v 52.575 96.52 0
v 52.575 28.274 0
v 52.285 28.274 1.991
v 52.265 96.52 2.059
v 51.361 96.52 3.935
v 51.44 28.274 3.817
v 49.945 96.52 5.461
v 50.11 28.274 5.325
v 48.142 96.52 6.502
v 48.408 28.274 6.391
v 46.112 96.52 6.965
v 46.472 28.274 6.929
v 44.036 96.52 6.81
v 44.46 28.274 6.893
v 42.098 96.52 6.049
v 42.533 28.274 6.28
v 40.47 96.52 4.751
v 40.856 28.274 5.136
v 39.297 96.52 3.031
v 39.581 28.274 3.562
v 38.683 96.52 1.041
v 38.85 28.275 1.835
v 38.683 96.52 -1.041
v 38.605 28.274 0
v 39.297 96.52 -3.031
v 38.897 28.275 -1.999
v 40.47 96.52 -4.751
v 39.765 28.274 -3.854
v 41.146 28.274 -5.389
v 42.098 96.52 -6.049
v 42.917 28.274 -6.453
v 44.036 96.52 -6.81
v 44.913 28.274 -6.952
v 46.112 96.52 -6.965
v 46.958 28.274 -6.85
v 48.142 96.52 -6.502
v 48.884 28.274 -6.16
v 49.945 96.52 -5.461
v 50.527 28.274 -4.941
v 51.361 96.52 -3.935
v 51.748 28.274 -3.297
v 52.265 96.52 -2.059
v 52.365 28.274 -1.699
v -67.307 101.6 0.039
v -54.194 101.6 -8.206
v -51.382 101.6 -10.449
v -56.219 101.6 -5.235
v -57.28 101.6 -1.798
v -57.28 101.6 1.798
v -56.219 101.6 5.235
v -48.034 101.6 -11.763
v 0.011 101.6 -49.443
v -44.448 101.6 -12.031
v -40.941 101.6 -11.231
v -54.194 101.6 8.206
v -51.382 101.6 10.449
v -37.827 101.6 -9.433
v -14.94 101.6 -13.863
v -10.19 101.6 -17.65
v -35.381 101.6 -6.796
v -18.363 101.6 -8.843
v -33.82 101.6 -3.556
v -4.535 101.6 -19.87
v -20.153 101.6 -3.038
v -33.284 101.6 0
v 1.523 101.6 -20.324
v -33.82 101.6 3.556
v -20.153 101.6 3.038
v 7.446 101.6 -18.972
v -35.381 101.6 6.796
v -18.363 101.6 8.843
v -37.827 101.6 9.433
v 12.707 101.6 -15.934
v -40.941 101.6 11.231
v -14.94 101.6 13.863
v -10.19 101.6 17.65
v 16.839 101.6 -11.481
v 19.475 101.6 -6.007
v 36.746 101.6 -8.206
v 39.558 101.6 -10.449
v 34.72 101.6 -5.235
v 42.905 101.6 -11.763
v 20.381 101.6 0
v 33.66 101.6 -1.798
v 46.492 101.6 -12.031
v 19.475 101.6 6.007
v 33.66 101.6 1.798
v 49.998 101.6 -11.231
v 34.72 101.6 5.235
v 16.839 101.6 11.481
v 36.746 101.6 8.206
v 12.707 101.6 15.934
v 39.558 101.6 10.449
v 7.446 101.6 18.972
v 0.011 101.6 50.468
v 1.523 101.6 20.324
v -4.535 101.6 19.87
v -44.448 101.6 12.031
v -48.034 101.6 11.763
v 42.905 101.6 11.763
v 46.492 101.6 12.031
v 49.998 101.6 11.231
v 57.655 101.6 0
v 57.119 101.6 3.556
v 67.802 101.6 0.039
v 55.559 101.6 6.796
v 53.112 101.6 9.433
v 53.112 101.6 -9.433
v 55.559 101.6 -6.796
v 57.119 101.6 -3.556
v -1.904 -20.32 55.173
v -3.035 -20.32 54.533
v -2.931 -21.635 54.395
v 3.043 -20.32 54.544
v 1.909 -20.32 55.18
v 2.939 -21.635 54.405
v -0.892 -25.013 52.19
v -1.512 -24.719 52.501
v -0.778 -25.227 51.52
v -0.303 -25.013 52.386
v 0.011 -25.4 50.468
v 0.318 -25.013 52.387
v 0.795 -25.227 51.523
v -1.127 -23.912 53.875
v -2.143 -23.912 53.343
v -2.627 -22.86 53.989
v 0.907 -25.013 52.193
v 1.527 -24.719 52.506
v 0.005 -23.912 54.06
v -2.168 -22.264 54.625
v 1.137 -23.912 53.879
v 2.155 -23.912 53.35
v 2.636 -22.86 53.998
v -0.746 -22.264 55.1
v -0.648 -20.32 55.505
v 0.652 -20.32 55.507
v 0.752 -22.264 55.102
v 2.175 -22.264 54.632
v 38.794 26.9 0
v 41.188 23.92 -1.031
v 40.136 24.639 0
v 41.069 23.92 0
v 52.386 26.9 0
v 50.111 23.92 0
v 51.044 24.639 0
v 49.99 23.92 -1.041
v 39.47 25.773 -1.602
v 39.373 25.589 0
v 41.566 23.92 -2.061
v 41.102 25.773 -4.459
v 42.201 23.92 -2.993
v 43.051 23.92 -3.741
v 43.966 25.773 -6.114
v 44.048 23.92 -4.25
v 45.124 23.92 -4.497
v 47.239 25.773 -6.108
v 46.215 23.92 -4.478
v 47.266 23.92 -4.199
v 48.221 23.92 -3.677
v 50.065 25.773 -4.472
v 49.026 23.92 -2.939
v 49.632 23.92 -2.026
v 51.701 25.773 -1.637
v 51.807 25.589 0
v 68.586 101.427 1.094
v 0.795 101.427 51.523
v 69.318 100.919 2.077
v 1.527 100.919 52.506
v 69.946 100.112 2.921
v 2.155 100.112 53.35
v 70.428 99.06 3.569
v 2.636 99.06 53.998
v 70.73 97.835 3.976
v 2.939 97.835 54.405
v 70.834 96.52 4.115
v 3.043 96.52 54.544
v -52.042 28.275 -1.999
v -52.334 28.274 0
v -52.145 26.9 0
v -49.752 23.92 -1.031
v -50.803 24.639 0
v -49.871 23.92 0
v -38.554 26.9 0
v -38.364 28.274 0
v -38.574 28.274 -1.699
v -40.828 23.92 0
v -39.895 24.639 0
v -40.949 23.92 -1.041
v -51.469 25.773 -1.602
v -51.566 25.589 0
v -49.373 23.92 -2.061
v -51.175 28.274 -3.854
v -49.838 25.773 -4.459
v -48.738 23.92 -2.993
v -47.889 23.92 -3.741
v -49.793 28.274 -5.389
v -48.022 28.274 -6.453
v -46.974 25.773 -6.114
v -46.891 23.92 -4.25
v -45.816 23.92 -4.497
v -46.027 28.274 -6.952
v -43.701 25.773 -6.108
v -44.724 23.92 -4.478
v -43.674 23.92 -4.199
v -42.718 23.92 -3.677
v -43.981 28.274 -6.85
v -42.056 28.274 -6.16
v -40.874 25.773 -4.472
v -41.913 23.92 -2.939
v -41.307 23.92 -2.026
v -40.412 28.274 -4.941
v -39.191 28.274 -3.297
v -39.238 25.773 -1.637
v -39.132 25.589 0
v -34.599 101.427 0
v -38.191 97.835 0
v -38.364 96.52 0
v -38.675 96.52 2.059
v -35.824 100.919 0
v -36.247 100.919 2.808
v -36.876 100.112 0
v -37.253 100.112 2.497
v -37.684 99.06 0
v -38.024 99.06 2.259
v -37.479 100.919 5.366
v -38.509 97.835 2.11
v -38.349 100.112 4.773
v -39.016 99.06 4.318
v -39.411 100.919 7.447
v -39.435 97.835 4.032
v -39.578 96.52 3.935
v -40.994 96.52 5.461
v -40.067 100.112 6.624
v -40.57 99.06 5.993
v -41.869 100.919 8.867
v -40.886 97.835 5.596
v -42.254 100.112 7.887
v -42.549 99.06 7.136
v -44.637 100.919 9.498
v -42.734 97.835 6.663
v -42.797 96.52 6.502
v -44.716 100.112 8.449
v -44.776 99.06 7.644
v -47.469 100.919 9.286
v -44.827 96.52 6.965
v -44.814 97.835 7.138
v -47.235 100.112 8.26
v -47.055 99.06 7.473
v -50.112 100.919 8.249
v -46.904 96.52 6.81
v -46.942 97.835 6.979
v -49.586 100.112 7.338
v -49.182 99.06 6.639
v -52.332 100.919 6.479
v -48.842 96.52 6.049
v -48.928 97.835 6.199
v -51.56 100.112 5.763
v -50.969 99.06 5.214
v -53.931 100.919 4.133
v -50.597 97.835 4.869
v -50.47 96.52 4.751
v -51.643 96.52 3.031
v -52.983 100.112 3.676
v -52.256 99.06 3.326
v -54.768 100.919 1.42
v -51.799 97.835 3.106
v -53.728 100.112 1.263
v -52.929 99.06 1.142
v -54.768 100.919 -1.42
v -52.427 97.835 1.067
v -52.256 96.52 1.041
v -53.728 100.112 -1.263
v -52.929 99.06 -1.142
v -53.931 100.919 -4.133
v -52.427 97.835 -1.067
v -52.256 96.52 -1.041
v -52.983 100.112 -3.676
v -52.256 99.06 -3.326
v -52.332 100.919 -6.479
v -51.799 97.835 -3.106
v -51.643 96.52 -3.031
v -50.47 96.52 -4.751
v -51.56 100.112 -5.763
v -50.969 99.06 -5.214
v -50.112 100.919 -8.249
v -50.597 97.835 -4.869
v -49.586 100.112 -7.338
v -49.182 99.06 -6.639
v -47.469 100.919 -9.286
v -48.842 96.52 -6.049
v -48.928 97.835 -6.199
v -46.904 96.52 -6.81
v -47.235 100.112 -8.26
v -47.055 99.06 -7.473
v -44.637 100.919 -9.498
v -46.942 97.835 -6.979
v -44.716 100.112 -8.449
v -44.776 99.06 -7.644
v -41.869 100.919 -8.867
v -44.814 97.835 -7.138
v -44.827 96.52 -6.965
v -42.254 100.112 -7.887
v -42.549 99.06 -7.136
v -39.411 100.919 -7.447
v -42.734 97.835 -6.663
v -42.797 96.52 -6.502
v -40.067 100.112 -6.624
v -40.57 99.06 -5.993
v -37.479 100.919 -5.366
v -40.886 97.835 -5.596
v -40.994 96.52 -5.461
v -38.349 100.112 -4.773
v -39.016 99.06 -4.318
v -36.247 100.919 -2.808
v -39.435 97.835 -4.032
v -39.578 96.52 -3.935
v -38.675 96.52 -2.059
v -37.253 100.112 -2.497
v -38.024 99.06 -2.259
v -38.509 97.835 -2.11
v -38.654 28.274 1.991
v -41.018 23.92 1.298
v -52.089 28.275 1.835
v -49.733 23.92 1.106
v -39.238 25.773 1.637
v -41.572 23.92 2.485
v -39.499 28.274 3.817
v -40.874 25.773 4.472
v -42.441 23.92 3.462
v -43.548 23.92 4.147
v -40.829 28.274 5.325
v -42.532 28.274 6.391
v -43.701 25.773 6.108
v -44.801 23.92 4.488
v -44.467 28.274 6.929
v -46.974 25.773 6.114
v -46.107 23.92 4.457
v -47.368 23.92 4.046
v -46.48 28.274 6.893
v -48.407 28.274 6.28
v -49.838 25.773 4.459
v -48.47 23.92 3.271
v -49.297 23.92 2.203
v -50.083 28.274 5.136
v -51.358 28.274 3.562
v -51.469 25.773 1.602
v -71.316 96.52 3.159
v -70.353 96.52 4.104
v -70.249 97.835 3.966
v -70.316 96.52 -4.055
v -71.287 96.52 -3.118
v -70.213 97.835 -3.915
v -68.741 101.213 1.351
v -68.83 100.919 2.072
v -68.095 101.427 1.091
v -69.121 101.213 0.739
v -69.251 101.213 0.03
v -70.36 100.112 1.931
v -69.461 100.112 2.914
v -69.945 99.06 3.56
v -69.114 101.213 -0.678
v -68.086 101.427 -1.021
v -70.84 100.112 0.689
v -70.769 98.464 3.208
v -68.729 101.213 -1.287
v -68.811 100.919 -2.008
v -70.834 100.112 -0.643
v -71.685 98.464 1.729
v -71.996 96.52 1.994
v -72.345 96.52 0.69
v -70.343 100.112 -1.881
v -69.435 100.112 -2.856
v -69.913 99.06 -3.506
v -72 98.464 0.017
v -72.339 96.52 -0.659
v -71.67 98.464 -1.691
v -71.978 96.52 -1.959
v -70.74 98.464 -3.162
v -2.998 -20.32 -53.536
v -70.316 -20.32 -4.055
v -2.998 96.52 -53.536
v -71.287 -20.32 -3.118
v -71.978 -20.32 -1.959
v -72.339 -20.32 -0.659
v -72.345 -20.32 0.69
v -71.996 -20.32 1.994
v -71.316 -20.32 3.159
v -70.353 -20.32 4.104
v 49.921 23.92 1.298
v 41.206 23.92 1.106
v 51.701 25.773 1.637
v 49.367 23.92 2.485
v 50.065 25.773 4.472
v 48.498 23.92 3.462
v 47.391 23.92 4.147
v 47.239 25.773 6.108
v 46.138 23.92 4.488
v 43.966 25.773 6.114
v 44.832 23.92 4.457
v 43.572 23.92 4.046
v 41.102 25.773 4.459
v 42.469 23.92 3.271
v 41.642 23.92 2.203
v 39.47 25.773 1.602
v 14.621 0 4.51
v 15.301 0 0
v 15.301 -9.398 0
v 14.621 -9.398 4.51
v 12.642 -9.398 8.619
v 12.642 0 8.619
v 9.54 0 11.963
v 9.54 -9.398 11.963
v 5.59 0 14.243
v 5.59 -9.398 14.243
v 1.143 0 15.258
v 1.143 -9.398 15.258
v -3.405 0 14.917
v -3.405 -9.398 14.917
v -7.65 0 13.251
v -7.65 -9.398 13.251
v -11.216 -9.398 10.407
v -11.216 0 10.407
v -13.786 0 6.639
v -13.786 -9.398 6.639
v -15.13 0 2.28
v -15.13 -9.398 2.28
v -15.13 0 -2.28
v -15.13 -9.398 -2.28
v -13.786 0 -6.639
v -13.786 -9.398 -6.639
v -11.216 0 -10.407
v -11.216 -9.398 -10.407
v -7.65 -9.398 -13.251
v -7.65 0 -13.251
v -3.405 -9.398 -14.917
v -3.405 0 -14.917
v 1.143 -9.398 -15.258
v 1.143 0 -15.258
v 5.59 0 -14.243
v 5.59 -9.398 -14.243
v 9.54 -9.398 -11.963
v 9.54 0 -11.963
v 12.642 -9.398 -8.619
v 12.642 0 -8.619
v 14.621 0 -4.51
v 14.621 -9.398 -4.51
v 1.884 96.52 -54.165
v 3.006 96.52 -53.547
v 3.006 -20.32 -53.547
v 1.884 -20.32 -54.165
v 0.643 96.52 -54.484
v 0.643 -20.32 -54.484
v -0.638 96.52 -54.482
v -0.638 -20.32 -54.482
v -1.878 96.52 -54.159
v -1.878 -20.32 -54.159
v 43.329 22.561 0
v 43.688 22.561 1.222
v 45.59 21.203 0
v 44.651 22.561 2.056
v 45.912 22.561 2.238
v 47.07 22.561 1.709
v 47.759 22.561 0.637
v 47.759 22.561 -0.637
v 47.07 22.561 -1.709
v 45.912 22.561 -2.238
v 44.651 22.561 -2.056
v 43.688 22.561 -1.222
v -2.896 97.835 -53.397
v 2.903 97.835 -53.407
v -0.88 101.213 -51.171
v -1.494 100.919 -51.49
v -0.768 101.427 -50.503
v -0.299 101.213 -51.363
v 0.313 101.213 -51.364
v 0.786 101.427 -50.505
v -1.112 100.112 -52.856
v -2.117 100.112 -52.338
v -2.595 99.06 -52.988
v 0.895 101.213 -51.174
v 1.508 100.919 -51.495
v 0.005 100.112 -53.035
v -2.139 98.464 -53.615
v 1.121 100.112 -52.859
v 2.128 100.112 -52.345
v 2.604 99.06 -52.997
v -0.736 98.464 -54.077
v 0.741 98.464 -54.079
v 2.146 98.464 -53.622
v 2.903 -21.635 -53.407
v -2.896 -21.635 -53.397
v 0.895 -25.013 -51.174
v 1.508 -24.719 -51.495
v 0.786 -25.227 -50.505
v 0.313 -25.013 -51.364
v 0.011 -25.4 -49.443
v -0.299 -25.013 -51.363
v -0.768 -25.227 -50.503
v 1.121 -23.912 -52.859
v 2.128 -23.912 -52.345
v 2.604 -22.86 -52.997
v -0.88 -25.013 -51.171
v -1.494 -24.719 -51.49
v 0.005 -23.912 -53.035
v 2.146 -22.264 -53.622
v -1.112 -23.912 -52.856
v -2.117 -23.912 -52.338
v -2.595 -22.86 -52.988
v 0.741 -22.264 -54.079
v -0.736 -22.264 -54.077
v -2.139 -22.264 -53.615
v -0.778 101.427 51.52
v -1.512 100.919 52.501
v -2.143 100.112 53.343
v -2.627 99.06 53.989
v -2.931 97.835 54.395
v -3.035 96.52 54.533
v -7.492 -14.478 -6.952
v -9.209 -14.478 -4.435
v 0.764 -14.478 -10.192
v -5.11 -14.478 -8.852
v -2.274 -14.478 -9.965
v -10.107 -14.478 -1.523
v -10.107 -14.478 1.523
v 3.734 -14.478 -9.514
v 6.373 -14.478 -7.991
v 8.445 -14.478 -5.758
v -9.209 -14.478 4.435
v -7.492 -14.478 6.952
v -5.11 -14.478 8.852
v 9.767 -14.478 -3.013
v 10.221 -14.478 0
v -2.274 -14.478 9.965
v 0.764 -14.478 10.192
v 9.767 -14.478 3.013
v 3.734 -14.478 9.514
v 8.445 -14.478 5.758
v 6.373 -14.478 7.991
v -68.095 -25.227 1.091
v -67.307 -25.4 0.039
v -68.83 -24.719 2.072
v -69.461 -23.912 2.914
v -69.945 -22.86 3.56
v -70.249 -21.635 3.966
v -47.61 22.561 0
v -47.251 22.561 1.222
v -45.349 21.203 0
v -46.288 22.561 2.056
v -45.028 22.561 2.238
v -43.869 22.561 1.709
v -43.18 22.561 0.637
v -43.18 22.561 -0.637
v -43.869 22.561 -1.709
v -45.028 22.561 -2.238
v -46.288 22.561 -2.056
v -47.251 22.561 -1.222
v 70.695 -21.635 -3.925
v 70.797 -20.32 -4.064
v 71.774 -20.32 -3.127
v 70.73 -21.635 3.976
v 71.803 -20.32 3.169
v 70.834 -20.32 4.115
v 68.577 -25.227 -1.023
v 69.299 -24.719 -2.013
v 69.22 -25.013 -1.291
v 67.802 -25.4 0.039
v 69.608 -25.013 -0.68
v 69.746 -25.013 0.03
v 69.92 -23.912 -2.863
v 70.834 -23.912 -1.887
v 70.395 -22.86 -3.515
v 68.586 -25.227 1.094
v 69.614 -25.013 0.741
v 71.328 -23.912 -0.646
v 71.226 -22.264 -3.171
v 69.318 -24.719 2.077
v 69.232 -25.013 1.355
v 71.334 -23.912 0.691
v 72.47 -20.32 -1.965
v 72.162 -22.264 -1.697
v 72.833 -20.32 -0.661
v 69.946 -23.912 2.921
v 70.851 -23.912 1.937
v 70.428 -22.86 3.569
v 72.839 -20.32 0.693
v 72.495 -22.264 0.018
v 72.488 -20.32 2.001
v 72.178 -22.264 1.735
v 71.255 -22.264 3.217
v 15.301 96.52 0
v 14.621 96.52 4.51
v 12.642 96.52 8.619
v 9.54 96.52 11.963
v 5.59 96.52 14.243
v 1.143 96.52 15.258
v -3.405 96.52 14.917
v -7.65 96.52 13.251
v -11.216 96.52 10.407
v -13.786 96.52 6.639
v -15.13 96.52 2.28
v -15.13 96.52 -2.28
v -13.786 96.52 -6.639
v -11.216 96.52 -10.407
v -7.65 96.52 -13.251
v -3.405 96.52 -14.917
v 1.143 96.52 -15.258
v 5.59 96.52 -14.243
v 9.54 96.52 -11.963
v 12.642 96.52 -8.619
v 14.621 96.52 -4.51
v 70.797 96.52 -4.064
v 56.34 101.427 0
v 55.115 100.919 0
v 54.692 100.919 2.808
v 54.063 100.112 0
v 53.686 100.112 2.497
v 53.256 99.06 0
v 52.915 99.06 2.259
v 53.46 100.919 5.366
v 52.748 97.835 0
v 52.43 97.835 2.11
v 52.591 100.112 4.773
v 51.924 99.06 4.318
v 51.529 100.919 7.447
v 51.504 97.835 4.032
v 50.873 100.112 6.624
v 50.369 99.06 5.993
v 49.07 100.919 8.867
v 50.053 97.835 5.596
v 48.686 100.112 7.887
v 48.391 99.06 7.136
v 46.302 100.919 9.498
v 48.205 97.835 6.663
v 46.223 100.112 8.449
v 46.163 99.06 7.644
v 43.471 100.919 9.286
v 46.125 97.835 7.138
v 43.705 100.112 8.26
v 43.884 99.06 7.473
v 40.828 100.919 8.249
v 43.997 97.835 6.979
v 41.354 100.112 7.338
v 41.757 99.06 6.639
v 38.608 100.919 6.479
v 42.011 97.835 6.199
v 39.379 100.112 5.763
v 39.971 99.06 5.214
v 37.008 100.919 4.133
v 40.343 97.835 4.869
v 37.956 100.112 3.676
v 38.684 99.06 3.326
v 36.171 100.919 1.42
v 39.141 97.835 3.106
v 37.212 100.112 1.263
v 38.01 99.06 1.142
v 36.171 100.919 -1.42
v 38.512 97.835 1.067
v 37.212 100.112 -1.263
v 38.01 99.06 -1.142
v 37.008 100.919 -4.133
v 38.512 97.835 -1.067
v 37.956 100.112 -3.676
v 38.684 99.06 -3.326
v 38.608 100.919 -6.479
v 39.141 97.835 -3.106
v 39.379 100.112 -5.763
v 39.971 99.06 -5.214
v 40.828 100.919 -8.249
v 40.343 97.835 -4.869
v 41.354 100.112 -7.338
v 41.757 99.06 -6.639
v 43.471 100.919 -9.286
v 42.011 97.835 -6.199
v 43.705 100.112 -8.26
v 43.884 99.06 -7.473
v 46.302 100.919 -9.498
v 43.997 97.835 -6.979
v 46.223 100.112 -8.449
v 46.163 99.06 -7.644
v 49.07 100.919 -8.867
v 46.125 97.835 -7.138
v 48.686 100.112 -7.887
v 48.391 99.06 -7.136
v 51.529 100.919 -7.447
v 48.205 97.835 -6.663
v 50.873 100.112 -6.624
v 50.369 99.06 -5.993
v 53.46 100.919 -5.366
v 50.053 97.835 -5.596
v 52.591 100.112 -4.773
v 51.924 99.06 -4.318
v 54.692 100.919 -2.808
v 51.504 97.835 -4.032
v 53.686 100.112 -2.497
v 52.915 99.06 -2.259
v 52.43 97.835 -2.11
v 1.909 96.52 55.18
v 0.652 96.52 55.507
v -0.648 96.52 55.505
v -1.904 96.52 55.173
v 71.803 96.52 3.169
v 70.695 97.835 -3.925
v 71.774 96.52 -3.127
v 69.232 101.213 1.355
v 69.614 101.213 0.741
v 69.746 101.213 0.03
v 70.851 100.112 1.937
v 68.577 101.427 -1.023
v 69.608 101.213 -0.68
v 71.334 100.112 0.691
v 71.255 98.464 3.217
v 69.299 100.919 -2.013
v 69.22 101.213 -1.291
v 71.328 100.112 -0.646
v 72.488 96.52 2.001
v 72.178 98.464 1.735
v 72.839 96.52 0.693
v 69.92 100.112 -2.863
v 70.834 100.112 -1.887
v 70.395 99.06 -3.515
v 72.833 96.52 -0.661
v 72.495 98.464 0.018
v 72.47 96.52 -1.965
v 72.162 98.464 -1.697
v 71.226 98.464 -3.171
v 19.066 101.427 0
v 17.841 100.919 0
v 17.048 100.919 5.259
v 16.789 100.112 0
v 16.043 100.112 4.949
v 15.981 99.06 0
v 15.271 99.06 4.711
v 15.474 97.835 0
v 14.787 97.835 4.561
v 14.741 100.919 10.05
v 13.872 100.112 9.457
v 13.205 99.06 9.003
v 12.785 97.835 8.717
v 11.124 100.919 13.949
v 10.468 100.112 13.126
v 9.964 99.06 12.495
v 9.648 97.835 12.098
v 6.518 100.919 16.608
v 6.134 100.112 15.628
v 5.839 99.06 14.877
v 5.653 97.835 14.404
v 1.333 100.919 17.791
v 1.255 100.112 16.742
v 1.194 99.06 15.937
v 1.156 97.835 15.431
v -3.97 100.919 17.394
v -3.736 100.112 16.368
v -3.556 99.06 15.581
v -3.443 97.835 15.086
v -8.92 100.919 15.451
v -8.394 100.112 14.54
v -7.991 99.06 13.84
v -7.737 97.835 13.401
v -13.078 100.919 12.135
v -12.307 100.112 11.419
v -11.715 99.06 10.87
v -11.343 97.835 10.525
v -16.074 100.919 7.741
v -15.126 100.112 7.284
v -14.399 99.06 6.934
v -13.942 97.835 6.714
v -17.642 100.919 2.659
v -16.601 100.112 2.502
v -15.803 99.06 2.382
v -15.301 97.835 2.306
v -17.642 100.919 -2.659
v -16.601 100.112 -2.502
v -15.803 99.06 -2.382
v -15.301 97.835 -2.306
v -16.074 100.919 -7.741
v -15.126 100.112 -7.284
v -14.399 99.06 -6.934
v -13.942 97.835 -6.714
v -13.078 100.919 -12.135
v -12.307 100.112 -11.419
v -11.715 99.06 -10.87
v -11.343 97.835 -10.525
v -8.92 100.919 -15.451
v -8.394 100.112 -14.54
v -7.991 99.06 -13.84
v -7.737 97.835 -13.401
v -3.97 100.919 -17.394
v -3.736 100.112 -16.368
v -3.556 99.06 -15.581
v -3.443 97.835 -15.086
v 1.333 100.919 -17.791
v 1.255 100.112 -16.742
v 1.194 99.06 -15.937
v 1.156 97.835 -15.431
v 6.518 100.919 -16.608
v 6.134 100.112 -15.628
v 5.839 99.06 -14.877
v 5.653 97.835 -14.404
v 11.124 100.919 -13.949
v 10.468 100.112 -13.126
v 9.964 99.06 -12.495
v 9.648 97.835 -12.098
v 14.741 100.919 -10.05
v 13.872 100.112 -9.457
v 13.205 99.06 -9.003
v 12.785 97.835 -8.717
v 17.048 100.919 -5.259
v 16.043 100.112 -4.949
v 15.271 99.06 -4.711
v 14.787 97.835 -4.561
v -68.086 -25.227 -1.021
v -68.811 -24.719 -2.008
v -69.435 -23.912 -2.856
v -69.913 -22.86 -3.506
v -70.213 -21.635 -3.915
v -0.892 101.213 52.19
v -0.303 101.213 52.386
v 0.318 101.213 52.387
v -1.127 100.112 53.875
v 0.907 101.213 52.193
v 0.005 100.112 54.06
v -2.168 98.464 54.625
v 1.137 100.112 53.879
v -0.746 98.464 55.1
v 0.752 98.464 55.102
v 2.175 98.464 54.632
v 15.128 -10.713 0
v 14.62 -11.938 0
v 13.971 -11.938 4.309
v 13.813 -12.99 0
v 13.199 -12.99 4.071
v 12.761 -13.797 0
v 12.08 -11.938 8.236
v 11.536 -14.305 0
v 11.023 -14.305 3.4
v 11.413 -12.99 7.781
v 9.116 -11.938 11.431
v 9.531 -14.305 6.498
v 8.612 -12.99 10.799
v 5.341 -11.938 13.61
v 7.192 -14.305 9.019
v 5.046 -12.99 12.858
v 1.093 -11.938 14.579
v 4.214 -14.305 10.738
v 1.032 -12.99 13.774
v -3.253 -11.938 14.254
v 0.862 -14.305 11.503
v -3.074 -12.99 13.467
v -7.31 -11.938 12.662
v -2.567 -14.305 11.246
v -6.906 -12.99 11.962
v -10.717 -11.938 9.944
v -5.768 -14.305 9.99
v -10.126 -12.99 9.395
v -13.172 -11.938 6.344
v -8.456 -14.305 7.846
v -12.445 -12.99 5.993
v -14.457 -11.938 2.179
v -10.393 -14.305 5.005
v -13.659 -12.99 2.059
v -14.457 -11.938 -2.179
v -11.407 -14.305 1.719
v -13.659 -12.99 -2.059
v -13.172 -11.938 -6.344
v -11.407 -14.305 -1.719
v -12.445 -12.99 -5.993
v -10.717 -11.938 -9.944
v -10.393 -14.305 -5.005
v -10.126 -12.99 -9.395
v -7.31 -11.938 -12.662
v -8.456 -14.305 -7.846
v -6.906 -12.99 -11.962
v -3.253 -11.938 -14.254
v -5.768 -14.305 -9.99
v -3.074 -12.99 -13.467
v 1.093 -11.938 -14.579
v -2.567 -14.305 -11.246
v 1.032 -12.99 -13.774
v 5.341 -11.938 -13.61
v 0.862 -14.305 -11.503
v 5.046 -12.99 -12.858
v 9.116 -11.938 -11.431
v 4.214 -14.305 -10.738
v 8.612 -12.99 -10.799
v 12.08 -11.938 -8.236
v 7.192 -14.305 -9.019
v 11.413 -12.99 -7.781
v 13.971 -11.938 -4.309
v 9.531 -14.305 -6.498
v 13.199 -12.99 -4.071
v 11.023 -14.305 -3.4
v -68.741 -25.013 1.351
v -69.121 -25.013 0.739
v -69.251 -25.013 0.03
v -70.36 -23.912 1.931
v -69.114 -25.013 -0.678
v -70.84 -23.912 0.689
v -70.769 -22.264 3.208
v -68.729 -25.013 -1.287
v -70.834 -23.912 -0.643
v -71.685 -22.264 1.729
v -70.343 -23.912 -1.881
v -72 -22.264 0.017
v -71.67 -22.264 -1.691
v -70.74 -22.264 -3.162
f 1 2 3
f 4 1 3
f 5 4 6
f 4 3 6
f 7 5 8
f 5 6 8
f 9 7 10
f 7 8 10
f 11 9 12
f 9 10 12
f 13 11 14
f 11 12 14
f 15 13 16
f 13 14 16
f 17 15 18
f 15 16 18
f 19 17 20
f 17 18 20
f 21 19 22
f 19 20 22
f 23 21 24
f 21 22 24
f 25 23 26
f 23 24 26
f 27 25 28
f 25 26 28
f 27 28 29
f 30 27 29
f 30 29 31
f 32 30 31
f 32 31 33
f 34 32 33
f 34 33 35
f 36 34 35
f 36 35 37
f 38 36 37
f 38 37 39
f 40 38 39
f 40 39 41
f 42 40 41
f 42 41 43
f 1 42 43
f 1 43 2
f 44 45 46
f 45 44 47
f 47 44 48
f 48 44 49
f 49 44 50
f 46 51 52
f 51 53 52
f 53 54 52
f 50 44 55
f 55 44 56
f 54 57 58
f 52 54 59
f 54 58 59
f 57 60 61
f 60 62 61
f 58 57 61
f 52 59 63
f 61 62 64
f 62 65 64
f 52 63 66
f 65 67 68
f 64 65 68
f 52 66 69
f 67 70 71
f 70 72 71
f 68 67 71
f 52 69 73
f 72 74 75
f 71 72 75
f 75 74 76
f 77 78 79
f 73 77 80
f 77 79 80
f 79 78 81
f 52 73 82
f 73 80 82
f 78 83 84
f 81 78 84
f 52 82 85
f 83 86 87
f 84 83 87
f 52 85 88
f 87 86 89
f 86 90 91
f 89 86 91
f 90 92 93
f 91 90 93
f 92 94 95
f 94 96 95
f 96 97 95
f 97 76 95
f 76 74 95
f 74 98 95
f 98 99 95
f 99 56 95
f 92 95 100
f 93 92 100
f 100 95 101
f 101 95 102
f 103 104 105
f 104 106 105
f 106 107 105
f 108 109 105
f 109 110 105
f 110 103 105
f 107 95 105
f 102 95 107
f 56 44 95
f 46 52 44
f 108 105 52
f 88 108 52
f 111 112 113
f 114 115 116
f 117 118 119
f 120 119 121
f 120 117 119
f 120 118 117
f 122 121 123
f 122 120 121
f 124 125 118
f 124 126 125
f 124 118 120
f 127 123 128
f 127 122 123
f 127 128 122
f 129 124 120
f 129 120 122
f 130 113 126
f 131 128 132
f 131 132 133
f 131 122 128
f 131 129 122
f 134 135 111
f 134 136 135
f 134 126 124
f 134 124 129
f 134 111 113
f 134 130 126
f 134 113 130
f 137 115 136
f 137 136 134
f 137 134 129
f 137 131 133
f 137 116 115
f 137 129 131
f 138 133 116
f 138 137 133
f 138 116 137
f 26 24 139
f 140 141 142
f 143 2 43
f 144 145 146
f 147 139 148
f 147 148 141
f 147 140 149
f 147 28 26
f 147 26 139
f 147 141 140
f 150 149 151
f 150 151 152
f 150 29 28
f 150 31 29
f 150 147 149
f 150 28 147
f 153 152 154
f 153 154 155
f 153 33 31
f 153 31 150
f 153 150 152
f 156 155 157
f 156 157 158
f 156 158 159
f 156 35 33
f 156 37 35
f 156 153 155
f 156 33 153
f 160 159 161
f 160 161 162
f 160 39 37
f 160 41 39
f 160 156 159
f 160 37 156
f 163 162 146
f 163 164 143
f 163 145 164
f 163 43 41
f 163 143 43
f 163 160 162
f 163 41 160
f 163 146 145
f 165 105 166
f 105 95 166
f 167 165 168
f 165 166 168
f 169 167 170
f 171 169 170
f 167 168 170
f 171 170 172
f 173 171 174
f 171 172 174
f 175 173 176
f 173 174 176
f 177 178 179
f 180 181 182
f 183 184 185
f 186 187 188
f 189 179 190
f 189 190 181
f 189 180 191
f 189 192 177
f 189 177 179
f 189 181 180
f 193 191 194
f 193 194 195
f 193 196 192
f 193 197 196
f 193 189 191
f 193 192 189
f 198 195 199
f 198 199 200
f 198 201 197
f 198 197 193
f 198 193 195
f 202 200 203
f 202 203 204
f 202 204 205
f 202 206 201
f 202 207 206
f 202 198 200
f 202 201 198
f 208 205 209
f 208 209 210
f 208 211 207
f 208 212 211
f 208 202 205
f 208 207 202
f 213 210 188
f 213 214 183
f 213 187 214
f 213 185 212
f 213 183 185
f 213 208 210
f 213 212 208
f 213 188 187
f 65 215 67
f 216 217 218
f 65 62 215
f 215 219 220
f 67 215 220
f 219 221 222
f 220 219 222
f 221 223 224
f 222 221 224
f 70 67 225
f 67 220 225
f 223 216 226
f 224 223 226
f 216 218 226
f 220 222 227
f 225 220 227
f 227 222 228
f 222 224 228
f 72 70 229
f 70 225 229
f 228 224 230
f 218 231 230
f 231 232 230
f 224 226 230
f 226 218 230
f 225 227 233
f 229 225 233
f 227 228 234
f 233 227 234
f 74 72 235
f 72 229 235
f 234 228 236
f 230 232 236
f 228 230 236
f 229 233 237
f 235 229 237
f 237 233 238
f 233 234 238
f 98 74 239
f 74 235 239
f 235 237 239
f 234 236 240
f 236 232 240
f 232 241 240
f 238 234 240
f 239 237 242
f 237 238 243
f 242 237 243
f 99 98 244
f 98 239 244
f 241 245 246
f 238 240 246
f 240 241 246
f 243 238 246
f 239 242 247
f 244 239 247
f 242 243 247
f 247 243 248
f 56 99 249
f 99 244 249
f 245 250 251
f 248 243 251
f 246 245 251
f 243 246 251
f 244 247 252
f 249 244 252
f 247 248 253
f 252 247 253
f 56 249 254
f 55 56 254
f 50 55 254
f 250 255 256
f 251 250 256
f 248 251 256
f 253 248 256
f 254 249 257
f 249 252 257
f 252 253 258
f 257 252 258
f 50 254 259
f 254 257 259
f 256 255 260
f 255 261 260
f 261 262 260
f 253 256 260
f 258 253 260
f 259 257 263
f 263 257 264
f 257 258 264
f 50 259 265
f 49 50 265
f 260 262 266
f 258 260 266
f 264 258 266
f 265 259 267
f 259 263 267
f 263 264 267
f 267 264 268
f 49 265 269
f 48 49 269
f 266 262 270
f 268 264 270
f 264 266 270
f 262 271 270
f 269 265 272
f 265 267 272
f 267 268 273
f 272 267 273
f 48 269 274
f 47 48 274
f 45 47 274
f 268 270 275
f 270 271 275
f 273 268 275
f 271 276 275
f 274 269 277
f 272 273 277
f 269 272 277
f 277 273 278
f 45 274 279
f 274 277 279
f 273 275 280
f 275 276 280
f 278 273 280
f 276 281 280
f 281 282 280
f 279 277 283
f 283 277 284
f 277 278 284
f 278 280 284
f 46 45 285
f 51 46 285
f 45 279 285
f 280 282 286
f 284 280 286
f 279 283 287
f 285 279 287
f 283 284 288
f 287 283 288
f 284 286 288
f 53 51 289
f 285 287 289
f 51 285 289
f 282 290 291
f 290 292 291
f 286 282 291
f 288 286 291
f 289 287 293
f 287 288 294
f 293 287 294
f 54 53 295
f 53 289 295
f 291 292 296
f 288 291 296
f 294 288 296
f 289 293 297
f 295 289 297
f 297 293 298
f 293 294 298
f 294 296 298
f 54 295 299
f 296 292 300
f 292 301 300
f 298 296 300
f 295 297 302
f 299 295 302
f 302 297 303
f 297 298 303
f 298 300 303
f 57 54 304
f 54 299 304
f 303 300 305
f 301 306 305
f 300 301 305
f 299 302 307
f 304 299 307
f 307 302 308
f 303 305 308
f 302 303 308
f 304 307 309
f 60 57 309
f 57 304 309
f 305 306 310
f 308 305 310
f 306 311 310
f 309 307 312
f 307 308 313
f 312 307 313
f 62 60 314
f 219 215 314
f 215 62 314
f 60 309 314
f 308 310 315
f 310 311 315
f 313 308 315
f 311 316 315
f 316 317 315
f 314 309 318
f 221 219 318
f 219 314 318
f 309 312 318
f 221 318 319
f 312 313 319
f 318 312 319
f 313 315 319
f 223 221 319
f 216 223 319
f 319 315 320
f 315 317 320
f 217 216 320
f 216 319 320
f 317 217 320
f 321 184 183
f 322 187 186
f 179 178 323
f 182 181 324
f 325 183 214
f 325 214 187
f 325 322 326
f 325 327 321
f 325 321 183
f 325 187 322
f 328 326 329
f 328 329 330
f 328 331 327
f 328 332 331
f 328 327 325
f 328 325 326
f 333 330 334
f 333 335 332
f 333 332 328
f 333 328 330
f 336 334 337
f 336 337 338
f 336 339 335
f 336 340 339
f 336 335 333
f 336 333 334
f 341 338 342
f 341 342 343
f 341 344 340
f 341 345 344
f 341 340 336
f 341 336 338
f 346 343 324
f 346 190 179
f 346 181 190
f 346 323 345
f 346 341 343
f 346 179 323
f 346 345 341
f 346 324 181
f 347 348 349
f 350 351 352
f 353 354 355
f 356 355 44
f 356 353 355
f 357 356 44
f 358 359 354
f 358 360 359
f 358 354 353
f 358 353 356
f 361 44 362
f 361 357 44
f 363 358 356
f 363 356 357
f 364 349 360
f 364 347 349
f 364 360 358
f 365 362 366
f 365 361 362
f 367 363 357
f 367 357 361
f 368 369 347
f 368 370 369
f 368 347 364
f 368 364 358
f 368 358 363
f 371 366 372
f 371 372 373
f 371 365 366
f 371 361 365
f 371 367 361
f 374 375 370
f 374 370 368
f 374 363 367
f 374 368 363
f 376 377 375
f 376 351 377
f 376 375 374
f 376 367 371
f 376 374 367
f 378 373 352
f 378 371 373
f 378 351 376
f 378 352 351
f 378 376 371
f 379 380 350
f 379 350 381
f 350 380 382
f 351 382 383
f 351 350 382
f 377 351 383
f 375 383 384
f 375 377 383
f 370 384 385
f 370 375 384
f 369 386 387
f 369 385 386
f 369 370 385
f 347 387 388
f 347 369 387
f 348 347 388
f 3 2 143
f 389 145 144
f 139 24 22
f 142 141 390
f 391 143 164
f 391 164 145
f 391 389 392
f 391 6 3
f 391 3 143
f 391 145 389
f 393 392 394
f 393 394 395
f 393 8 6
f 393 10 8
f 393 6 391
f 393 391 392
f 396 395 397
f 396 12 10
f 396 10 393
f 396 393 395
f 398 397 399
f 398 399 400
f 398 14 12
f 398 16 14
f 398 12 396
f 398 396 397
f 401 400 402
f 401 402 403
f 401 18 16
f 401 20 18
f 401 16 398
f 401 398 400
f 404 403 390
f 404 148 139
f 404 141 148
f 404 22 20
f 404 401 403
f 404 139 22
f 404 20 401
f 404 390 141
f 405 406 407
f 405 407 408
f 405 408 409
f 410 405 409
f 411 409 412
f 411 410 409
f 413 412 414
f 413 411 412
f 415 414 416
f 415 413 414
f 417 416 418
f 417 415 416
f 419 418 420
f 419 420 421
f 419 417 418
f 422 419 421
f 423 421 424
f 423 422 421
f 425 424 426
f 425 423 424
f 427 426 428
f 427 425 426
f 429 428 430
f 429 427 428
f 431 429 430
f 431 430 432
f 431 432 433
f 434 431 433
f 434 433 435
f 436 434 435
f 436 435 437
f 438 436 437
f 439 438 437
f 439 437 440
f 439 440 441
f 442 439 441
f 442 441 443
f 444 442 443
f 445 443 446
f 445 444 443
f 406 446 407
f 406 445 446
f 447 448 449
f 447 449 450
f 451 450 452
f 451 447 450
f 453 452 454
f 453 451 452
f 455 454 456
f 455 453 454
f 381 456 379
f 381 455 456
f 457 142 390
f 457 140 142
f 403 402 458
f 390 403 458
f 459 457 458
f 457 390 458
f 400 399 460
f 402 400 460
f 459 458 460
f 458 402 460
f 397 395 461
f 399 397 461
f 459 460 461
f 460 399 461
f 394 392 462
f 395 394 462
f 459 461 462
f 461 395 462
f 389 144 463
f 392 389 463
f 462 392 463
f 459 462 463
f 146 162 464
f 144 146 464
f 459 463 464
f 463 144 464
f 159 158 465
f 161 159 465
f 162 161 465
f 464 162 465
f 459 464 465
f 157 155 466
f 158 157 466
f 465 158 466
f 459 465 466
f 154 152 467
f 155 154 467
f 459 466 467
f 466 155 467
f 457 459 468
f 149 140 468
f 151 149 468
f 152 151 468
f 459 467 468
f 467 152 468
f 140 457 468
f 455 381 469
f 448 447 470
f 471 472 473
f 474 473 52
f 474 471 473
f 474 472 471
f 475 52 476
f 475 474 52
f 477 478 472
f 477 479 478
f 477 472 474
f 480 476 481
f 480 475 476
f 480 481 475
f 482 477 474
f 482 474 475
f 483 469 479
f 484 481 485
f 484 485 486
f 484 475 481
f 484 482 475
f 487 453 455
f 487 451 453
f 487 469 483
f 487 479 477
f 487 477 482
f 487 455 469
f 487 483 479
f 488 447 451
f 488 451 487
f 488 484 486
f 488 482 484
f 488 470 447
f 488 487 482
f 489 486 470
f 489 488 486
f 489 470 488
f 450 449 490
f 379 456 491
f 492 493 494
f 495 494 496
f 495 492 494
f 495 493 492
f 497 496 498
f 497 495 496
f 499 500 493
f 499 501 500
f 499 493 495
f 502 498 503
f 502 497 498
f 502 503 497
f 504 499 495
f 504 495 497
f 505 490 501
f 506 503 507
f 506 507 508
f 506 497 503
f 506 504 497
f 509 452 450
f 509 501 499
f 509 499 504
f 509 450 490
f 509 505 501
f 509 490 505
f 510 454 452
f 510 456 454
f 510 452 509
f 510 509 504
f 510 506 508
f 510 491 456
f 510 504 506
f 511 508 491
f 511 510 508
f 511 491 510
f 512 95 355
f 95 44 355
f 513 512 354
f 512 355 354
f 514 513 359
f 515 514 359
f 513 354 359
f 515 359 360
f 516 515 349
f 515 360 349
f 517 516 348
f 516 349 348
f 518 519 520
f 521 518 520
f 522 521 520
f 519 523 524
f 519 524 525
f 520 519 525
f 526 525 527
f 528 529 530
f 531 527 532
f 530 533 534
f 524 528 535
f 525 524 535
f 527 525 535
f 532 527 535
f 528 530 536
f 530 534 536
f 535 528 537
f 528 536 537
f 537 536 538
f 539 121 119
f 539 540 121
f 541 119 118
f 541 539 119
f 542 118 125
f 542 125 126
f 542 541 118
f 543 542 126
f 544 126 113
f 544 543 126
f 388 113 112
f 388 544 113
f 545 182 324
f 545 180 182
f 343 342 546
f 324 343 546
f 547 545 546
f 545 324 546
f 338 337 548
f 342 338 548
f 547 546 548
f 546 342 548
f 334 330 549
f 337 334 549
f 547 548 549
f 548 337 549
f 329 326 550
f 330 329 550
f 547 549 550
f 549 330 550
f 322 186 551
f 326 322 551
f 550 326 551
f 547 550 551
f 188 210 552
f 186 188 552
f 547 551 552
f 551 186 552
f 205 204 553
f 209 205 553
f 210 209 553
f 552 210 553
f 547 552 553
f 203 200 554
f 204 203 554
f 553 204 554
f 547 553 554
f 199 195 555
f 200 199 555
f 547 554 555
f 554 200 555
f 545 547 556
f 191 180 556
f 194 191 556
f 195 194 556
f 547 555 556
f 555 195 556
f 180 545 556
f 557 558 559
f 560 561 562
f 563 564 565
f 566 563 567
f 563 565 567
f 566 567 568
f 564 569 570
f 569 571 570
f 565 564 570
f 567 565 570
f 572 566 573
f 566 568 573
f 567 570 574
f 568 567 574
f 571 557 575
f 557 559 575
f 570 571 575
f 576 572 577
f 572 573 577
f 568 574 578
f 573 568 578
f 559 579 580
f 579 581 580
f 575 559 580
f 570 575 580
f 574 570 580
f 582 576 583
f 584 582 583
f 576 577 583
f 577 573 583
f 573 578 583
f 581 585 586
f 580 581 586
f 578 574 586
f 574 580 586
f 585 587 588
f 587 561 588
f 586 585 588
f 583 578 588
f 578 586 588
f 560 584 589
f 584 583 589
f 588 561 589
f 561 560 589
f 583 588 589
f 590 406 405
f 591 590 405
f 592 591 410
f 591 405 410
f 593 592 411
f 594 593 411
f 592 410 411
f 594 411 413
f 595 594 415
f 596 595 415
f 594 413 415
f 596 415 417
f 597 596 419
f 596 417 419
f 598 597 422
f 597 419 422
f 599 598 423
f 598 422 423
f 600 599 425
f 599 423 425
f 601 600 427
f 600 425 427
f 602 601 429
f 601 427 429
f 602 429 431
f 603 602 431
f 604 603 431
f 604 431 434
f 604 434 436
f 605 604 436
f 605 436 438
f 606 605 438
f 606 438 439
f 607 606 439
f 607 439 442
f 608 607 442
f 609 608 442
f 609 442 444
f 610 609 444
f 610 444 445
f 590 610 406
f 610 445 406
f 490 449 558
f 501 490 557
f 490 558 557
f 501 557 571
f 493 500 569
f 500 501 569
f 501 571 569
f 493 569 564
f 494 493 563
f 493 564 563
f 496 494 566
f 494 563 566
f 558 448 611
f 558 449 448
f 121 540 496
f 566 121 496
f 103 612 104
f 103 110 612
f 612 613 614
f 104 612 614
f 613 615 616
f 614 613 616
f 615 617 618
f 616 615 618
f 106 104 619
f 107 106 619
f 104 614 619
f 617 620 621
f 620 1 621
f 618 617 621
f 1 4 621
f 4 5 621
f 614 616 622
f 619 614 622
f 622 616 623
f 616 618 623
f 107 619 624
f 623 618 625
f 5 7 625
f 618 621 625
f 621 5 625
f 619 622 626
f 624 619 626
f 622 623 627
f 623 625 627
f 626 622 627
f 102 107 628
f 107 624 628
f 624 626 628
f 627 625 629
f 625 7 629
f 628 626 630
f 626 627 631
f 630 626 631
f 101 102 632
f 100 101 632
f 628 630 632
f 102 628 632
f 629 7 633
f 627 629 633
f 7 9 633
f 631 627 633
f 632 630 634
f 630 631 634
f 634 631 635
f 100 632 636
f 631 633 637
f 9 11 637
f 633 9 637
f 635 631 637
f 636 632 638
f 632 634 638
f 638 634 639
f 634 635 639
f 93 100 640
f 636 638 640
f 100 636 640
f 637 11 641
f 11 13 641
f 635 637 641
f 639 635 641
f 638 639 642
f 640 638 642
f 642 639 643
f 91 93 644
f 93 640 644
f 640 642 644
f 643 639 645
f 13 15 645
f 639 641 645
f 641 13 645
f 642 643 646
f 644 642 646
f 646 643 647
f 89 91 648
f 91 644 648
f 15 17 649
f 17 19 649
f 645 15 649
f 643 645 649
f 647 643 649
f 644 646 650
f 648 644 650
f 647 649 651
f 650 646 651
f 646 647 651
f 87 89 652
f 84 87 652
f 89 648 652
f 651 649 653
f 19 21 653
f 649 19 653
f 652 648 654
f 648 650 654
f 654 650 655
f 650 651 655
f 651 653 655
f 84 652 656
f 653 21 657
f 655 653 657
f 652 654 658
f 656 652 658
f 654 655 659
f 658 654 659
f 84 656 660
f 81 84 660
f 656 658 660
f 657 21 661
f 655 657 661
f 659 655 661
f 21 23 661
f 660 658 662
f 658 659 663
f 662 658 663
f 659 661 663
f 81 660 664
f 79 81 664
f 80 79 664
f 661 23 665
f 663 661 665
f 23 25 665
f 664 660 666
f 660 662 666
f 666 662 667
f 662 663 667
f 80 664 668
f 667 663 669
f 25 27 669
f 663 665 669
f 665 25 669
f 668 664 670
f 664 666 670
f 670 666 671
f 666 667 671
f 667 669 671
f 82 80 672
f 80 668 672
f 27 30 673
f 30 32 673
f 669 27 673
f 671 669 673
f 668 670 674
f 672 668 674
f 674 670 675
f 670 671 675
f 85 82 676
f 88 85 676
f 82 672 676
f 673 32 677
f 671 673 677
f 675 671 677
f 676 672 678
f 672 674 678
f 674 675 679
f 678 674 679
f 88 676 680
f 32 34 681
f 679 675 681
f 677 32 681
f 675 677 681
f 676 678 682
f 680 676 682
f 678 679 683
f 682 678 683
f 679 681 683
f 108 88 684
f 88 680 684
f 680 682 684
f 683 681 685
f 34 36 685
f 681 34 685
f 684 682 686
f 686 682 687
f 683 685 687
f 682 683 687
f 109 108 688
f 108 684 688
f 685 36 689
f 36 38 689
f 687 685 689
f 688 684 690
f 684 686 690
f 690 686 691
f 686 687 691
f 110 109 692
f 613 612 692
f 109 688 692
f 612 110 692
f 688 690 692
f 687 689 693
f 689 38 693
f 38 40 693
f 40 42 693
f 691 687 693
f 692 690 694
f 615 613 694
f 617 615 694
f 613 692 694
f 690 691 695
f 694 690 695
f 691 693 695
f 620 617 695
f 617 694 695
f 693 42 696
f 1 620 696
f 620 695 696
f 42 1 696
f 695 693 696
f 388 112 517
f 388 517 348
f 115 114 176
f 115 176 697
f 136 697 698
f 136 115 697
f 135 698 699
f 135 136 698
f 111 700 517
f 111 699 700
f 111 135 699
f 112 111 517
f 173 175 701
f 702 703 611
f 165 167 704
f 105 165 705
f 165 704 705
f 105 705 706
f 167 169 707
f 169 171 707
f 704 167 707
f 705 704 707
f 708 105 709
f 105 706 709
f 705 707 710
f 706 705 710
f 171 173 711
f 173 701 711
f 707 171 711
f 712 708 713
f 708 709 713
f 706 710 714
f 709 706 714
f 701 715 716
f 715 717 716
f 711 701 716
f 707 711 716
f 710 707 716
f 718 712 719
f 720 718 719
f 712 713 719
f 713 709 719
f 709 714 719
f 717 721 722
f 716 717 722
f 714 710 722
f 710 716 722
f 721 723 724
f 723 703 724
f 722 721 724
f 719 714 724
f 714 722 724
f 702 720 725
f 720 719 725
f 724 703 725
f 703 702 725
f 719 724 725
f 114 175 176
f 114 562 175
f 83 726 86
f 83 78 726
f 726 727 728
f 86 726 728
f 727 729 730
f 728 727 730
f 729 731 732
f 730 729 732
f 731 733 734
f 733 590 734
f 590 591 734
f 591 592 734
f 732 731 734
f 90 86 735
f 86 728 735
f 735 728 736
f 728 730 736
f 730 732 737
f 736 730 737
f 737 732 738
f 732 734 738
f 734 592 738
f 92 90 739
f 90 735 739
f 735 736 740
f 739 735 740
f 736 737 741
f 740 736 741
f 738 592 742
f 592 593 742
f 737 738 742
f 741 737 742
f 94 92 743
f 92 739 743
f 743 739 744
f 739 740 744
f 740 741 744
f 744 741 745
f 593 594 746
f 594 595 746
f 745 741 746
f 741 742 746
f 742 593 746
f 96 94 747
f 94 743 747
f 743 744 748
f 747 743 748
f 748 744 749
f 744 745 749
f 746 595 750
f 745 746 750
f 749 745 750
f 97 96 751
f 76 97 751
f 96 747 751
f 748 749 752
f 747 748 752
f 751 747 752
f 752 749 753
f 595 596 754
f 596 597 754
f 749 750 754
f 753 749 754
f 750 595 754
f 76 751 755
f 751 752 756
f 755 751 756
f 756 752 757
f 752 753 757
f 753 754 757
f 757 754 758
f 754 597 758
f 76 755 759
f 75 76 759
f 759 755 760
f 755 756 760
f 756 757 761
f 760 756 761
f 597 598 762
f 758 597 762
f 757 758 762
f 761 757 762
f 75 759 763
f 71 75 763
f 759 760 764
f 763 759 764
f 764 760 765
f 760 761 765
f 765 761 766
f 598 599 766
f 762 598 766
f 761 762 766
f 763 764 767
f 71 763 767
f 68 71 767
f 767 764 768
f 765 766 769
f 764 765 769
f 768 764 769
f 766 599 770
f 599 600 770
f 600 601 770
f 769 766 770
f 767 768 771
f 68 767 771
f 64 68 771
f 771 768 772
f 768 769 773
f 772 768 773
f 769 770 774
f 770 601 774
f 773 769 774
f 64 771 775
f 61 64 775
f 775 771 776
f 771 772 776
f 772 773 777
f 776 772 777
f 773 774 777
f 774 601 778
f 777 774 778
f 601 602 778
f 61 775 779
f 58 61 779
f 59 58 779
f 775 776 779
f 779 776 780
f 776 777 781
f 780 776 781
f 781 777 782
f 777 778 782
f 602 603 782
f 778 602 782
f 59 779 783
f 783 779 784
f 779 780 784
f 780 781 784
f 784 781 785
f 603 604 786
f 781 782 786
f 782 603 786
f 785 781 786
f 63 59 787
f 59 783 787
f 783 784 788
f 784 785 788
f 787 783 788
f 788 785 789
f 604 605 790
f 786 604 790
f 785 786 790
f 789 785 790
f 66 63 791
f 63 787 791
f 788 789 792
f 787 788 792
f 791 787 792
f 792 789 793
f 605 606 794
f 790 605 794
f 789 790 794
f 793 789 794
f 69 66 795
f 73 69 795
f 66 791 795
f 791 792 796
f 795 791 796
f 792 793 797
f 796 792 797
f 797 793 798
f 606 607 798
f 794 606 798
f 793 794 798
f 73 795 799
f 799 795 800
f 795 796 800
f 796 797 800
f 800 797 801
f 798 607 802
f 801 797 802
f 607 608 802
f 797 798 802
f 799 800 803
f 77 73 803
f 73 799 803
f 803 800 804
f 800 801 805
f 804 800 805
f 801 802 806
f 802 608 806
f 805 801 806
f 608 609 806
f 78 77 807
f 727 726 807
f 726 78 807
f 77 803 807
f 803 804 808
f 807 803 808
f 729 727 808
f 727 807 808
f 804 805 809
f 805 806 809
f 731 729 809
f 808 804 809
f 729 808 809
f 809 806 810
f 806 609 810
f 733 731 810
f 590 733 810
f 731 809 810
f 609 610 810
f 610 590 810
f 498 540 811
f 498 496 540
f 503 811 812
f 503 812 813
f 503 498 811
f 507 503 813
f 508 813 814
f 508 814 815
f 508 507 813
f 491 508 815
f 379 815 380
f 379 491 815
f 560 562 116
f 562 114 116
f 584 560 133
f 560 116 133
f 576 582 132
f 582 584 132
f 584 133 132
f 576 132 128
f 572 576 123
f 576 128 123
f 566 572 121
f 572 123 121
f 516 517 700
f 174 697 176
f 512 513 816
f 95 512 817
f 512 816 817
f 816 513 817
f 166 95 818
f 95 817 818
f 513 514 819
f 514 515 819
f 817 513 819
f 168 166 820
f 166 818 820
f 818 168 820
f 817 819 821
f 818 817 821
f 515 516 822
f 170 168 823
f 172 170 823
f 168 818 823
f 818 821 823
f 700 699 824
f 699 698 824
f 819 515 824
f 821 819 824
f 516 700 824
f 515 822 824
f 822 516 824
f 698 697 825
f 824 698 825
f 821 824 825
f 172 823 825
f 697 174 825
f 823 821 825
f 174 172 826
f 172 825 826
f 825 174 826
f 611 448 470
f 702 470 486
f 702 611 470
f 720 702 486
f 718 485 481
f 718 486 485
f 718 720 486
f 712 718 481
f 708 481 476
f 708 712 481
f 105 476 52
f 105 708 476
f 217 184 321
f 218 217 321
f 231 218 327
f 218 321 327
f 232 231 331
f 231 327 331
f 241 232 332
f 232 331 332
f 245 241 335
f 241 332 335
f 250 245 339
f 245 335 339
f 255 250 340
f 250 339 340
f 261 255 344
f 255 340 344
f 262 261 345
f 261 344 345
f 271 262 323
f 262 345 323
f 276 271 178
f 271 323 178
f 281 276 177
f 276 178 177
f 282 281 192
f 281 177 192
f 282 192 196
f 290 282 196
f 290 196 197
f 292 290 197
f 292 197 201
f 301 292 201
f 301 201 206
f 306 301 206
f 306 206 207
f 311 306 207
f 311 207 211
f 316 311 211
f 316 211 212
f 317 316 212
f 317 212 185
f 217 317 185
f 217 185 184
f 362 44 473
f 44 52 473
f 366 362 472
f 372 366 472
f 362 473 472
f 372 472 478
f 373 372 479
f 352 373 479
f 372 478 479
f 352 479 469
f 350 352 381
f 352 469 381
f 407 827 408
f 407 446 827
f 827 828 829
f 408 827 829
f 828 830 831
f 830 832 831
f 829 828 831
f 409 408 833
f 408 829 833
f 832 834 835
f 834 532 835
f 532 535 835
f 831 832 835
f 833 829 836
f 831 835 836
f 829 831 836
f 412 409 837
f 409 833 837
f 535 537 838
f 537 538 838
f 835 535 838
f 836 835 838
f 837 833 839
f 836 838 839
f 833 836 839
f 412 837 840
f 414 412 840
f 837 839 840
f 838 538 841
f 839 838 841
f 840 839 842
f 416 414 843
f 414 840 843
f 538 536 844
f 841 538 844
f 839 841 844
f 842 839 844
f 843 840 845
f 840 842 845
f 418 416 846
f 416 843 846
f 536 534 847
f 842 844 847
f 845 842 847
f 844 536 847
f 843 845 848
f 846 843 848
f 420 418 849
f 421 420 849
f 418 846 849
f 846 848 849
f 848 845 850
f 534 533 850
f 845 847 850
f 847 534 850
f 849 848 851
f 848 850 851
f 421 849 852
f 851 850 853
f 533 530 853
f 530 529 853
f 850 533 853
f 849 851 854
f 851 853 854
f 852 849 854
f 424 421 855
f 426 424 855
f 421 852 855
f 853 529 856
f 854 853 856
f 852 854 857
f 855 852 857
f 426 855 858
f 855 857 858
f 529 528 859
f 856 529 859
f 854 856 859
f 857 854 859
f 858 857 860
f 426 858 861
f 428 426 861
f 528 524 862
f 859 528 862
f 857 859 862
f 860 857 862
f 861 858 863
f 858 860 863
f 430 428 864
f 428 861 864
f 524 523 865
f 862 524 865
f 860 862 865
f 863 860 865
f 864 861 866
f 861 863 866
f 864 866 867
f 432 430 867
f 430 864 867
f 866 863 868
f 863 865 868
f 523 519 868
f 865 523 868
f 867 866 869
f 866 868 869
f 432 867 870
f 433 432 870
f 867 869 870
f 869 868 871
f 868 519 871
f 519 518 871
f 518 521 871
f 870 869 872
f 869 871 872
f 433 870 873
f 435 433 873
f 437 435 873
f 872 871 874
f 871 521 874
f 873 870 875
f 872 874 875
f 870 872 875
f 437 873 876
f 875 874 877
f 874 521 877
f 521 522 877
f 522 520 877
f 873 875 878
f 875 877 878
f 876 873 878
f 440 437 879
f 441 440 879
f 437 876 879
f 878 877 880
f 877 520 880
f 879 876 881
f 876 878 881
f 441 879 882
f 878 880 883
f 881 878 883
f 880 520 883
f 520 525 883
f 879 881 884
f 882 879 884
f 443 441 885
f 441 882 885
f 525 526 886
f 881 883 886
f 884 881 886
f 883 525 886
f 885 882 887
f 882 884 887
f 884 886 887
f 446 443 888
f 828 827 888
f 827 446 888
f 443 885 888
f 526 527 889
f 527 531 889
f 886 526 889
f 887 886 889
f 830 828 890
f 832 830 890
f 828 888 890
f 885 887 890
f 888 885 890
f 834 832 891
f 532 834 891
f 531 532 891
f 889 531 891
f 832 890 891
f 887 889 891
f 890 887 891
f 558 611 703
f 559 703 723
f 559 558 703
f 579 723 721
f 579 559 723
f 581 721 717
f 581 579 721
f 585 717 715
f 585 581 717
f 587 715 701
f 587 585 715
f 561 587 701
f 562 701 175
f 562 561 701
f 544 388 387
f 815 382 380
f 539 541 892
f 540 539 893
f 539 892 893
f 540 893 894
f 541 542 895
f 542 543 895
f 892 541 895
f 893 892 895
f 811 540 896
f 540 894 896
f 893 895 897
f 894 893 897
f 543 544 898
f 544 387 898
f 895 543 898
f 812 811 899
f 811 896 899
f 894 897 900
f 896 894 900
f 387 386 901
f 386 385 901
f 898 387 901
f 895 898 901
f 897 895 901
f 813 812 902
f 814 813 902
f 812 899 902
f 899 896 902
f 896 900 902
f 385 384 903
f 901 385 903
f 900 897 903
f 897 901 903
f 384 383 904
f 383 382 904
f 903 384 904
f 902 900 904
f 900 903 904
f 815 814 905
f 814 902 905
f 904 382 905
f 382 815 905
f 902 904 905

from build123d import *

# Parameters (mm, degrees)
F1_DEPTH       = 25.4
F2_R           = 15.300879685
F3_DEPTH       = 14.478
F4_DEPTH       = 101.6
F6_D           = 13.97
F6_DEPTH       = 76.2
F6_CBORE_D     = 13.97
F6_CBORE_DEPTH = 6.35
F6_TIP         = 4.1970114239
F8_D           = 13.97
F8_DEPTH       = 76.2
F8_CBORE_D     = 13.97
F8_CBORE_DEPTH = 6.35
F8_TIP         = 4.1970114239
F9_R           = 5.08


with BuildPart() as f1:
    # F0 (on Front) → F1 (new body)
    with BuildSketch(Plane.XZ):
        with BuildLine():
            ThreePointArc((-7.1662437988, 0), (-5.0672995858, 5.0672995858), (0, 7.1662437988))
            Line((0, 7.1662437988), (0, 56.8071007729))
            Line((0, 56.8071007729), (-75.8317038417, 0))
            Line((-75.8317038417, 0), (-7.1662437988, 0))
        make_face()
        with BuildLine():
            Line((0, 56.8071007729), (0, 7.1662437988))
            ThreePointArc((0, 7.1662437988), (5.0672995858, 5.0672995858), (7.1662437988, 0))
            Line((7.1662437988, 0), (76.3651058078, 0))
            Line((76.3651058078, 0), (0, 56.8071007729))
        make_face()
        with BuildLine():
            Line((76.3651058078, 0), (7.1662437988, 0))
            ThreePointArc((7.1662437988, 0), (5.0672995858, -5.0672995858), (0, -7.1662437988))
            Line((0, -7.1662437988), (0, -55.740300566))
            Line((0, -55.740300566), (76.3651058078, 0))
        make_face()
        with BuildLine():
            Line((0, -55.740300566), (0, -7.1662437988))
            ThreePointArc((0, -7.1662437988), (-5.0672995858, -5.0672995858), (-7.1662437988, 0))
            Line((-7.1662437988, 0), (-75.8317038417, 0))
            Line((-75.8317038417, 0), (0, -55.740300566))
        make_face()
        with BuildLine():
            Line((7.1662437988, 0), (0, 0))
            Line((0, 0), (0, -7.1662437988))
            ThreePointArc((0, -7.1662437988), (5.0672995858, -5.0672995858), (7.1662437988, 0))
        make_face()
        with BuildLine():
            Line((-7.1662437988, 0), (0, 0))
            Line((0, 0), (0, 7.1662437988))
            ThreePointArc((0, 7.1662437988), (-5.0672995858, 5.0672995858), (-7.1662437988, 0))
        make_face()
        with BuildLine():
            Line((0, 7.1662437988), (0, 0))
            Line((0, 0), (7.1662437988, 0))
            ThreePointArc((7.1662437988, 0), (5.0672995858, 5.0672995858), (0, 7.1662437988))
        make_face()
        with BuildLine():
            Line((0, -7.1662437988), (0, 0))
            Line((0, 0), (-7.1662437988, 0))
            ThreePointArc((-7.1662437988, 0), (-5.0672995858, -5.0672995858), (0, -7.1662437988))
        make_face()
    extrude(amount=F1_DEPTH)

    # F2 (on Front) → F3 (cut)
    with BuildSketch(Plane.XZ):
        Circle(F2_R)
    extrude(amount=F3_DEPTH, mode=Mode.SUBTRACT)

    # F4 (add): a face of the model
    f4_faces = [f1.faces().sort_by_distance(p)[0] for p in [
        (-36.7809633217, 0, 26.8885894929),
    ]]
    extrude(f4_faces, amount=F4_DEPTH)

    # F6
    with Locations(Plane(origin=(0, 101.6, 0), x_dir=(-1, 0, 0), z_dir=(0, 1, 0))):
        with Locations((-45.5900207162, 0)):
            CounterBoreHole(F6_D / 2, F6_CBORE_D / 2, F6_CBORE_DEPTH, depth=F6_DEPTH)
            with Locations((0, 0, -(F6_DEPTH + F6_TIP / 2))):  # 118° drill point
                Cone(0, F6_D / 2, F6_TIP, mode=Mode.SUBTRACT)

    # F8
    with Locations(Plane(origin=(0, 101.6, 0), x_dir=(-1, 0, 0), z_dir=(0, 1, 0))):
        with Locations((45.3492924571, 0)):
            CounterBoreHole(F8_D / 2, F8_CBORE_D / 2, F8_CBORE_DEPTH, depth=F8_DEPTH)
            with Locations((0, 0, -(F8_DEPTH + F8_TIP / 2))):  # 118° drill point
                Cone(0, F8_D / 2, F8_TIP, mode=Mode.SUBTRACT)

    # F9
    f9_edges = [f1.edges().sort_by_distance(p)[0] for p in [
        (38.182553, 101.6, 28.40355),
        (38.182553, 101.6, -27.87015),
        (-15.30088, -14.478, 0),
        (-15.30088, 101.6, 0),
        (-37.915852, -25.4, -27.87015),
        (0, 38.1, -55.740301),
        (-37.915852, 101.6, -27.87015),
        (-75.831704, 38.1, 0),
        (0, 38.1, 56.807101),
        (-37.915852, -25.4, 28.40355),
        (-37.915852, 101.6, 28.40355),
        (38.182553, -25.4, -27.87015),
        (38.182553, -25.4, 28.40355),
        (76.365106, 38.1, 0),
        (-38.364292, 101.6, 0),
        (52.575021, 101.6, 0),
        (-38.364292, 25.4, 0),
        (52.575021, 25.4, 0),
    ]]
    fillet(f9_edges, radius=F9_R)


solid = f1.part
